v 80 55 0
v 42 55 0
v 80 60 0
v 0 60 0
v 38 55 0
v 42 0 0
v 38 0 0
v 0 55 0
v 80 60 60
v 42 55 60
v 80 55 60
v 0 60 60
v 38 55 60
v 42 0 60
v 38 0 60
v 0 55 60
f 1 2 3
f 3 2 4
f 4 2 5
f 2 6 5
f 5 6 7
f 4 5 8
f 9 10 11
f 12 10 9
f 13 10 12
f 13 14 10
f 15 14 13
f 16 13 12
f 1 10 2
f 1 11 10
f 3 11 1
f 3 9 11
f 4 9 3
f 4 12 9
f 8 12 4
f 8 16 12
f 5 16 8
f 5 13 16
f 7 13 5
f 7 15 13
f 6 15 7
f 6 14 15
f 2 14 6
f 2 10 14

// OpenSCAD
$fn = 32;

// ----------------------------------------------------------------------
// Structural section: tee 80 x 60 mm
// ----------------------------------------------------------------------

// --- parameters (mm) ---
sec_w = 80;               // tee width, X
sec_h = 60;               // tee height, Y
flange_t = 5;             // top flange thickness
web_t = 4;                // web thickness
plate_t = 60;             // cut length, Z (extrusion height)

profile = [[38, 0], [42, 0], [42, 55], [80, 55], [80, 60], [0, 60], [0, 55], [38, 55]];  // primary outline, 8 points, counter clockwise

// --- the one profile operation ---
linear_extrude(height = plate_t) polygon(points = profile);
